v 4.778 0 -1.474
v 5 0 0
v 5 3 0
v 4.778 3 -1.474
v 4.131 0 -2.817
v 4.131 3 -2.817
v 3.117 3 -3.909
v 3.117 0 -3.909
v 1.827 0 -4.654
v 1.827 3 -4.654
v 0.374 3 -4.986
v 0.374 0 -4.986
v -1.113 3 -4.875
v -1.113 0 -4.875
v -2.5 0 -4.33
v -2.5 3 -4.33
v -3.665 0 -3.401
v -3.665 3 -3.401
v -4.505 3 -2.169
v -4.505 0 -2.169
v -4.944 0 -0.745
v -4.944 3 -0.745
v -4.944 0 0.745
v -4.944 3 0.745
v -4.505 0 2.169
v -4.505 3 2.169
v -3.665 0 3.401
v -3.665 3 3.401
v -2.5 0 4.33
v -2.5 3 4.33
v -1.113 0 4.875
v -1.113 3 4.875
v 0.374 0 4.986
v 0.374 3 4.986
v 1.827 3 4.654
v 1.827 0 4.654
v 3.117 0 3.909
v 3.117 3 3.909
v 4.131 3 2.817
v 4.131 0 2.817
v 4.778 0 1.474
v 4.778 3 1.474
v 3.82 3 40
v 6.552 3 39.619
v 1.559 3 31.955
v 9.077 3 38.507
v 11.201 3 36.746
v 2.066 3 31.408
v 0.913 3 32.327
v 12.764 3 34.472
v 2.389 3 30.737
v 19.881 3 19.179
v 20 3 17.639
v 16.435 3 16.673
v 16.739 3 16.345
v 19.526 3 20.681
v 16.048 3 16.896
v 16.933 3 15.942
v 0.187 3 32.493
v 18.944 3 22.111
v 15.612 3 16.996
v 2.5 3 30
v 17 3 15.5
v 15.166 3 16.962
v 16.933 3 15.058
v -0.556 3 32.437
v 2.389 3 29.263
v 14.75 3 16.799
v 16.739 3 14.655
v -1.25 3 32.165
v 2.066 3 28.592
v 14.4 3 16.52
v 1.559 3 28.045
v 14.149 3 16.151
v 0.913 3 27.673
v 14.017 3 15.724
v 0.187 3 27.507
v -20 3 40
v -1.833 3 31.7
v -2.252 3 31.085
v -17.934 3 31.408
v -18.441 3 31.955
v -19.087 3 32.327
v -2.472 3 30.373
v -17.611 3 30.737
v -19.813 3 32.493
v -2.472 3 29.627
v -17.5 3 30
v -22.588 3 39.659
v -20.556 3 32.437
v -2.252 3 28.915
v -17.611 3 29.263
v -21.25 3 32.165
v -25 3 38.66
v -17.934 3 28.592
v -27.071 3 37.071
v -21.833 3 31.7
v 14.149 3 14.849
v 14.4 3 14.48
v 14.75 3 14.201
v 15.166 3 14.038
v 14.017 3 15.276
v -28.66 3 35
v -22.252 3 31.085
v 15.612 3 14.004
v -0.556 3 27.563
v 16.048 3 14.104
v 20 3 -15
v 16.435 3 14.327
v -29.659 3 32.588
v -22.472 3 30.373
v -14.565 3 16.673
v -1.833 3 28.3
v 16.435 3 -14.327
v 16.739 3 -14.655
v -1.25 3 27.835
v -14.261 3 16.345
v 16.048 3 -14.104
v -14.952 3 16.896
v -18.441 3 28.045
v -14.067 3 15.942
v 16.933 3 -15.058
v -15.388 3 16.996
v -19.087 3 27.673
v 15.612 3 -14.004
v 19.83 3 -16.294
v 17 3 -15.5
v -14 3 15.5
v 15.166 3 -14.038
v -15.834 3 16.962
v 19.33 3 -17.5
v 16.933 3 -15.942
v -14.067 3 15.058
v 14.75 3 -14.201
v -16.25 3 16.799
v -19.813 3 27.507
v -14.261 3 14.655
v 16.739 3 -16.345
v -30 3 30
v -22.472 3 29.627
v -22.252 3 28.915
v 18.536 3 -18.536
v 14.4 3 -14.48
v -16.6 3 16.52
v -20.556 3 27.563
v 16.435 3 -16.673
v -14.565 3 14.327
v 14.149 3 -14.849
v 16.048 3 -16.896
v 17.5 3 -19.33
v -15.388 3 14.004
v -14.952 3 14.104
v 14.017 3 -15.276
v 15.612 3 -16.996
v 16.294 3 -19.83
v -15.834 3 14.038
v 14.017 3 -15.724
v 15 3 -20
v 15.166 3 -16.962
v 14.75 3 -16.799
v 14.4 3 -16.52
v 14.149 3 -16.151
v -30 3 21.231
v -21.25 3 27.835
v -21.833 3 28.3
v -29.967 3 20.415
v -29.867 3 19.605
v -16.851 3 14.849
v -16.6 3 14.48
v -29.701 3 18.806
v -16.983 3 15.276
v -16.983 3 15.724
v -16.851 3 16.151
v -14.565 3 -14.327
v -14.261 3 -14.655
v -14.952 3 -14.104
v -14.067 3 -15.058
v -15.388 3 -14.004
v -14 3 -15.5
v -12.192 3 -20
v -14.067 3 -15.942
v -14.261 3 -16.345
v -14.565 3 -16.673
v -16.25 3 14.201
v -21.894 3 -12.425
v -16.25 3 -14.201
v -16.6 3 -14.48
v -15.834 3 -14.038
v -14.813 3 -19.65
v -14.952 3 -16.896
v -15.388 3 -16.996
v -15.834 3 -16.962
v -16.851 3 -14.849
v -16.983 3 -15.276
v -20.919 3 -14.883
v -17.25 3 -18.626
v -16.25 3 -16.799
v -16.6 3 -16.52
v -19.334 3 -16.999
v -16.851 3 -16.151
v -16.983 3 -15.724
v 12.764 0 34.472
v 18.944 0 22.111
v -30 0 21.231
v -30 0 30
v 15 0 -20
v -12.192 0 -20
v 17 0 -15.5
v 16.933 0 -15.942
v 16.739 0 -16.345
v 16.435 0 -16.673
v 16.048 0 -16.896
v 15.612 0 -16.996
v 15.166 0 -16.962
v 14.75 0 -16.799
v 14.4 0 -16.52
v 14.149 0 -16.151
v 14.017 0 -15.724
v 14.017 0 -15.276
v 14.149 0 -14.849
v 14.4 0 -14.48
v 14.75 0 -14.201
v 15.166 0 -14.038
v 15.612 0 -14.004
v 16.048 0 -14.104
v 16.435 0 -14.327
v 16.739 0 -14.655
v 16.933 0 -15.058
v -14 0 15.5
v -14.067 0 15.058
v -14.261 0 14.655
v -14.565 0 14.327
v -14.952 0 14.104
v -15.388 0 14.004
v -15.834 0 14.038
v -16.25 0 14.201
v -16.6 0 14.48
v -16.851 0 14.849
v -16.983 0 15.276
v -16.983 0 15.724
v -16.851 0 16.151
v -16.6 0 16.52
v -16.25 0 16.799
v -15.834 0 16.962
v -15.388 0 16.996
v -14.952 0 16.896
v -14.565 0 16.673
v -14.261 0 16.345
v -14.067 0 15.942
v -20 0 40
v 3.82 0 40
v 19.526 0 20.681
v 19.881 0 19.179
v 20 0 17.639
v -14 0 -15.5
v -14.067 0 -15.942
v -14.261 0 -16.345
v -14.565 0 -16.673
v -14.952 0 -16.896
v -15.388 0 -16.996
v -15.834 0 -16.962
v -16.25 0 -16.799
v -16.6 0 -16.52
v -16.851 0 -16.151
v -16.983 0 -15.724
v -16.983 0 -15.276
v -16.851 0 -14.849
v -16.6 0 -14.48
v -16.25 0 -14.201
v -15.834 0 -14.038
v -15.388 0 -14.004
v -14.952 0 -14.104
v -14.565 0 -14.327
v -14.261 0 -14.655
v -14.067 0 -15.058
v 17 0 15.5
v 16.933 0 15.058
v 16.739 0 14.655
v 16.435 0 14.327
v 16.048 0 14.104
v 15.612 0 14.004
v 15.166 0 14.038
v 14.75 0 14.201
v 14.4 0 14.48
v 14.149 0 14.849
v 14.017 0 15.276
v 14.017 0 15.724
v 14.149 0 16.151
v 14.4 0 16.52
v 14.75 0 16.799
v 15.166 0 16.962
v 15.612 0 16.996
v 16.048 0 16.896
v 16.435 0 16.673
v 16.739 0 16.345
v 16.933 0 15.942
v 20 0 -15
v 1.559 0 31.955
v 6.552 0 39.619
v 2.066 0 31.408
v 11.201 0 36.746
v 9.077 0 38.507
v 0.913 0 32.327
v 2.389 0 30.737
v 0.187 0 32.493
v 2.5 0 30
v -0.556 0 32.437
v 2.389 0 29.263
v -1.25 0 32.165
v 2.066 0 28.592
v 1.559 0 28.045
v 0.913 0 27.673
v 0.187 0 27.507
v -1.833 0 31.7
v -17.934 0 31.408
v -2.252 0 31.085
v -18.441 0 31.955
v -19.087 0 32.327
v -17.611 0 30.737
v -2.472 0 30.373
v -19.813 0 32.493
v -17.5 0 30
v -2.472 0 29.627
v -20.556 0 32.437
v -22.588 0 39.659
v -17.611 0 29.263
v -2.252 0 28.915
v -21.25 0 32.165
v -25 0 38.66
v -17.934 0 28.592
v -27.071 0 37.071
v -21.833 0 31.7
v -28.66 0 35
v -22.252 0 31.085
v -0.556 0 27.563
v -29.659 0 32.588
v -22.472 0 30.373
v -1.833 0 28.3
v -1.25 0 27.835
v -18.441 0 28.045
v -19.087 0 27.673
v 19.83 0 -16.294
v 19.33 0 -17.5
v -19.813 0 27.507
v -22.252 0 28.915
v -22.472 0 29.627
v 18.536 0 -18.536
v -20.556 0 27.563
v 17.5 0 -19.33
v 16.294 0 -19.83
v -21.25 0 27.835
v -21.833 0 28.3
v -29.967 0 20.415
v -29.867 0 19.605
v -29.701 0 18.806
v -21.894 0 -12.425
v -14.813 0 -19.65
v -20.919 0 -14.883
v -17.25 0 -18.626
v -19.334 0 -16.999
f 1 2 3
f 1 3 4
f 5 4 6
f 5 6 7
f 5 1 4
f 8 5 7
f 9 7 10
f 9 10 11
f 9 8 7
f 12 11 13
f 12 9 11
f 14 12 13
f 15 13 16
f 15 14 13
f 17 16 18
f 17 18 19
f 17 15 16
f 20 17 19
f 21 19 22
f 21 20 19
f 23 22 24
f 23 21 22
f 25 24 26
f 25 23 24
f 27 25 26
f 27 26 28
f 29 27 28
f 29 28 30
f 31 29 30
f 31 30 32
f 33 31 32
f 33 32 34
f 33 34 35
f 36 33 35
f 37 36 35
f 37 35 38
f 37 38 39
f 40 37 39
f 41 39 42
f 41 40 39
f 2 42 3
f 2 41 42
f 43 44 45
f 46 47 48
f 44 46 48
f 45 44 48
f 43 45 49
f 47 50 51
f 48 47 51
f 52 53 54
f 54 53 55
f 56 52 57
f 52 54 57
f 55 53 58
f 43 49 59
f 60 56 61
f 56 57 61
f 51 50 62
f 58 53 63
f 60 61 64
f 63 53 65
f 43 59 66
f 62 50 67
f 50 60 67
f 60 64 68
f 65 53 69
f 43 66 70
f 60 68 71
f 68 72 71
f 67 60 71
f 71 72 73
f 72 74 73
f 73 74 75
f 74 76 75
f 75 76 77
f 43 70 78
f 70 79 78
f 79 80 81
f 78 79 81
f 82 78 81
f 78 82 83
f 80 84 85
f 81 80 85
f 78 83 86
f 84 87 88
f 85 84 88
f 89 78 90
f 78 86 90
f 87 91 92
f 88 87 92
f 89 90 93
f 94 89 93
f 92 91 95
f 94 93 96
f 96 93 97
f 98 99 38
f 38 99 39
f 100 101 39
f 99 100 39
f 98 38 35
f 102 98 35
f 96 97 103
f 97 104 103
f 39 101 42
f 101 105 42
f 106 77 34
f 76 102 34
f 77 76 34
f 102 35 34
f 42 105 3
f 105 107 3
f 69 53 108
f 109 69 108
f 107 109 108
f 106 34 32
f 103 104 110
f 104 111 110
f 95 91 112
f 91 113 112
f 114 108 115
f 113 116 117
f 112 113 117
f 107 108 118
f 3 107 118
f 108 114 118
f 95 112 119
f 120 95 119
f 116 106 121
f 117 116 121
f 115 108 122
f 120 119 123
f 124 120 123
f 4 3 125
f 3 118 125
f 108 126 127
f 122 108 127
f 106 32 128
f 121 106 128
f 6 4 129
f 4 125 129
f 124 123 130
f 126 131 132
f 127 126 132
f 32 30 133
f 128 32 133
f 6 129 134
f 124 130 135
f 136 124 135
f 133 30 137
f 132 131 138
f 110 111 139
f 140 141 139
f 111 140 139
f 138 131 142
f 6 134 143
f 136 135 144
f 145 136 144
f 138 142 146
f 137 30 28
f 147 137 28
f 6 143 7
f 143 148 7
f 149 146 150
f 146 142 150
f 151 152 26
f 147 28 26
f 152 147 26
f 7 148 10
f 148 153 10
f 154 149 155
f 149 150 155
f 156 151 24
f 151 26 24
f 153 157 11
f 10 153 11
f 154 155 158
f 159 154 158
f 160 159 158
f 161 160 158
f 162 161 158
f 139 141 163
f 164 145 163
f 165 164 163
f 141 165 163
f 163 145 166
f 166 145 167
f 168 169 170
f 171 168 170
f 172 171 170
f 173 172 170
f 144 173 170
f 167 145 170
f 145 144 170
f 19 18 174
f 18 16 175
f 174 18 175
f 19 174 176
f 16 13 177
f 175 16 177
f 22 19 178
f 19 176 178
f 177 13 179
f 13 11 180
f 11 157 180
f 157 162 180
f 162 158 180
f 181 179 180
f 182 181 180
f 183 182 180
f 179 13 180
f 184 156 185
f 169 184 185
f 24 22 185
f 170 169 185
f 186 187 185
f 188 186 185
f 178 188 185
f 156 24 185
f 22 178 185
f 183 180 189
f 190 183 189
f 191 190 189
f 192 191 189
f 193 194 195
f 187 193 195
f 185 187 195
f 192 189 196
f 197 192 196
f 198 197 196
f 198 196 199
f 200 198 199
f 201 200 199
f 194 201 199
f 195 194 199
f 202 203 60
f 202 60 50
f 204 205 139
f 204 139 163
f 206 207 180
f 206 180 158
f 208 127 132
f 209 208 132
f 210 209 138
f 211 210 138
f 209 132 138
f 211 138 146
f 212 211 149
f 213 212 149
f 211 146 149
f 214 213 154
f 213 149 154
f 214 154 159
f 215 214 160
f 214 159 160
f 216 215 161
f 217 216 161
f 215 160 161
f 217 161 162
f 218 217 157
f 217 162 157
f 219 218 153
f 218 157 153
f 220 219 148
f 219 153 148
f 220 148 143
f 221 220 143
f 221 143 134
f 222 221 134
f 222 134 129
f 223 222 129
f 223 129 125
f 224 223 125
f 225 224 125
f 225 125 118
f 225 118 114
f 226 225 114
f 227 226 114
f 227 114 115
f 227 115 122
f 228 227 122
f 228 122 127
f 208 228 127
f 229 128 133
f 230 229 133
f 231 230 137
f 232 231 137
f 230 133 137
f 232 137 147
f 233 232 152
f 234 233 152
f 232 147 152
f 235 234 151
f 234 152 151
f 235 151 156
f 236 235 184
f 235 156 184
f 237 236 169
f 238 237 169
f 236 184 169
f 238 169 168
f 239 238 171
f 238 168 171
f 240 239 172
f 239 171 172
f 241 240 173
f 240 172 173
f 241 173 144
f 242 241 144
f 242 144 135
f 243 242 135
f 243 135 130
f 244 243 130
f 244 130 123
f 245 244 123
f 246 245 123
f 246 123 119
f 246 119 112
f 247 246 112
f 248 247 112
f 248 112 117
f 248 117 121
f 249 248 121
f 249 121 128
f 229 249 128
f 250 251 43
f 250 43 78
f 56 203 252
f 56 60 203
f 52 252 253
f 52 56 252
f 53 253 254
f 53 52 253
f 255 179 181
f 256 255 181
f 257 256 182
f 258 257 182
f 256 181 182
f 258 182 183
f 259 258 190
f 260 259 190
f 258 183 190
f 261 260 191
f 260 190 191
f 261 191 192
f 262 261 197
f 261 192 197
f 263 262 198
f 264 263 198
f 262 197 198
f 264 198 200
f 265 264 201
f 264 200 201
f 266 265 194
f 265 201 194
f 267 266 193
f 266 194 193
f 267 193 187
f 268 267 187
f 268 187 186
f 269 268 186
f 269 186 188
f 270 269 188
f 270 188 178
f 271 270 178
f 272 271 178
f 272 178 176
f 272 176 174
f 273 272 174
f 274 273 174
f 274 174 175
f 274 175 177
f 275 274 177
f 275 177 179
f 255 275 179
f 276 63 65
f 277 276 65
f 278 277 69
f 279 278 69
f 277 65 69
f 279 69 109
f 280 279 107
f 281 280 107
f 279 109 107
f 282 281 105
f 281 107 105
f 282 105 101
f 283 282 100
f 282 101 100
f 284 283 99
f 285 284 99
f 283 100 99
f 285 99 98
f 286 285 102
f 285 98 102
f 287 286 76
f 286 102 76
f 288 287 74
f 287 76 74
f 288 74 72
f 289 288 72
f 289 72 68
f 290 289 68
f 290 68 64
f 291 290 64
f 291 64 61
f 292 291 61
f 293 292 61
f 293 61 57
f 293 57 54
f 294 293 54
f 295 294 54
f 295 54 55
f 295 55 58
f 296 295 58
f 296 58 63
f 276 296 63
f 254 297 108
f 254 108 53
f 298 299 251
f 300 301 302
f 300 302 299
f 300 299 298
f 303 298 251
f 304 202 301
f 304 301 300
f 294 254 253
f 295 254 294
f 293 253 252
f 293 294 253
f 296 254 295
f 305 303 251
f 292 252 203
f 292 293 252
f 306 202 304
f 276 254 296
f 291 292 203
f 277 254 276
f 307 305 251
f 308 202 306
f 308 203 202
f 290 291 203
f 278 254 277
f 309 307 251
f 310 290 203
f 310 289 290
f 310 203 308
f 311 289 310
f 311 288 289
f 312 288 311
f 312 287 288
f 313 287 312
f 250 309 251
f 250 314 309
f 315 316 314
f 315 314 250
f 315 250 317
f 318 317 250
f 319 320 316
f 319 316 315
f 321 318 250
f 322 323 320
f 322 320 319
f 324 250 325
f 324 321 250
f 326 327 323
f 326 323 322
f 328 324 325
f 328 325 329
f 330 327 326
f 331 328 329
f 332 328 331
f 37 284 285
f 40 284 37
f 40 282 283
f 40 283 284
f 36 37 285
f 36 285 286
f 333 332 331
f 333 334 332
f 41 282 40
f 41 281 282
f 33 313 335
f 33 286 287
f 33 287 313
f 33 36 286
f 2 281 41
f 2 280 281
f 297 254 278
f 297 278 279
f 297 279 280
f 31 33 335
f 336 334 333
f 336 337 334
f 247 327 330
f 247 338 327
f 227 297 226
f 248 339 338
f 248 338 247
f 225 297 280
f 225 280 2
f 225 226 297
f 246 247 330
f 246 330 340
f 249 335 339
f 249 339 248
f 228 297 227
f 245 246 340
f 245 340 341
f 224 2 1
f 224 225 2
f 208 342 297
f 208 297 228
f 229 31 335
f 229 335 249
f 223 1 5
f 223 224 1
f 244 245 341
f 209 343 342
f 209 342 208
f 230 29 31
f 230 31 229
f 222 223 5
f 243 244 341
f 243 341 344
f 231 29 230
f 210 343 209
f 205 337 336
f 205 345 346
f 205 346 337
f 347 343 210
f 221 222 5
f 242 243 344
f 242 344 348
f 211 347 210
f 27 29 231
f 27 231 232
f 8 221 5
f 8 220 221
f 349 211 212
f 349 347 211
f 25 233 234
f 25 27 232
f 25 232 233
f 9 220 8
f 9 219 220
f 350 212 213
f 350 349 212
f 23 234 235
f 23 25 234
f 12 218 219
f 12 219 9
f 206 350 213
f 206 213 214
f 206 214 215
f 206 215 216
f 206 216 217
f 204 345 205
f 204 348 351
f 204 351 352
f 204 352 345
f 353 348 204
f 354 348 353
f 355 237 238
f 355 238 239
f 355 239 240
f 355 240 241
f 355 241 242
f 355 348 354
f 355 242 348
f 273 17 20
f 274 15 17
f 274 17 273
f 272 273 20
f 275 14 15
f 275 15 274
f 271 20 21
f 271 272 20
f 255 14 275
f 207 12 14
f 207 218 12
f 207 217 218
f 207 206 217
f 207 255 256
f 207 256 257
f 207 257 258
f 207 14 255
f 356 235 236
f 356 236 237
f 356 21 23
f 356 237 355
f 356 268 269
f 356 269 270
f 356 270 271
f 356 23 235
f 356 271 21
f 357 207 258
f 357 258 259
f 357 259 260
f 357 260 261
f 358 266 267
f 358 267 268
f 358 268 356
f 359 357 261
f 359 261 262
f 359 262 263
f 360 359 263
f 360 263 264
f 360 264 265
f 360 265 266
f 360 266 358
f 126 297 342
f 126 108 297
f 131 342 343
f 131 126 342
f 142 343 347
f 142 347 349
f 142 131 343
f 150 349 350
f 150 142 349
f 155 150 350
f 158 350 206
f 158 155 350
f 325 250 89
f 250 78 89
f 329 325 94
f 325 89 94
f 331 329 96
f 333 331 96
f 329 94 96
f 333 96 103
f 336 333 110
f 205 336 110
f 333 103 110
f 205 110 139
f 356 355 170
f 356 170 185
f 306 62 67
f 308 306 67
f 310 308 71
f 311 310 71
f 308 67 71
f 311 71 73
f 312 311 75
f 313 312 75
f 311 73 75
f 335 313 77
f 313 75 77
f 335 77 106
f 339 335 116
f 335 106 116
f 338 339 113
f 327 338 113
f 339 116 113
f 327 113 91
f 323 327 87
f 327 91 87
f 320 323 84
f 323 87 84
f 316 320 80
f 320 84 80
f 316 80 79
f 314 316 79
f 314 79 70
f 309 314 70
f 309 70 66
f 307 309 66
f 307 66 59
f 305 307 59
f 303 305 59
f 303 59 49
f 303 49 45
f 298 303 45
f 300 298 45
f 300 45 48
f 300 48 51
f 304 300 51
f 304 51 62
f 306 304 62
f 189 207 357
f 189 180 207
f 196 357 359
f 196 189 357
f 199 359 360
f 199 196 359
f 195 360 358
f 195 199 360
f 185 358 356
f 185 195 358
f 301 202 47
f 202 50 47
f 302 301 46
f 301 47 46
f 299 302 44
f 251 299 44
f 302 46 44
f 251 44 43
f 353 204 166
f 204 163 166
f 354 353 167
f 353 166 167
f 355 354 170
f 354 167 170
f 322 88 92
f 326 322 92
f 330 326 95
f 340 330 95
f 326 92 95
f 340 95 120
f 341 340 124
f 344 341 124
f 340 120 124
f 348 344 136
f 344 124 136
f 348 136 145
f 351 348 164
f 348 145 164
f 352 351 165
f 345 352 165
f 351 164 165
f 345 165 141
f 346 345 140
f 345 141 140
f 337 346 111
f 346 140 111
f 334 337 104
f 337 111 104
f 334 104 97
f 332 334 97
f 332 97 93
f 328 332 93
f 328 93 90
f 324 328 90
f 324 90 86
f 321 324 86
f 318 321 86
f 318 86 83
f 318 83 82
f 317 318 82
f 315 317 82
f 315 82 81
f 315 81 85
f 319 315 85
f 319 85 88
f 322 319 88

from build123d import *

# Parameters (mm, degrees)
SKETCH1_R            = 5
BOSS_EXTRUDE1_DEPTH  = 3
SKETCH2_R            = 1.5
CUT_EXTRUDE1_DEPTH   = 4
LPATTERN1_COUNT      = 2
LPATTERN1_PITCH      = 31
LPATTERN1_COUNT_DIR2 = 2
LPATTERN1_PITCH_DIR2 = 31
SKETCH3_R            = 2.5
CUT_EXTRUDE2_DEPTH   = 4
LPATTERN2_COUNT      = 2
LPATTERN2_PITCH      = 20
FILLET1_R            = 10
FILLET2_R            = 5


with BuildPart() as part:
    # Sketch1 → Boss-Extrude1 (new body)
    with BuildSketch(Plane(origin=(0, 0, 0), x_dir=(1, 0, 0), z_dir=(0, 1, 0))):
        Polygon((20, -20), (10, -40), (-30, -40), (-30, -20), (-20, 20), (20, 20), align=None)
        Circle(SKETCH1_R, mode=Mode.SUBTRACT)
    extrude(amount=BOSS_EXTRUDE1_DEPTH)

    # Sketch2 → Cut-Extrude1 (cut, through all)
    with BuildSketch(Plane(origin=(0, 3, 0), x_dir=(1, 0, 0), z_dir=(0, 1, 0))):
        with Locations((-15.5, 15.5)):
            Circle(SKETCH2_R)
    cut_extrude1 = extrude(amount=-CUT_EXTRUDE1_DEPTH, mode=Mode.SUBTRACT)

    # LPattern1: Cut-Extrude1 2 × 2
    with Locations(*[(i * LPATTERN1_PITCH, 0, j * LPATTERN1_PITCH_DIR2) for i in range(LPATTERN1_COUNT) for j in range(LPATTERN1_COUNT_DIR2) if (i, j) != (0, 0)]):
        add(cut_extrude1, mode=Mode.SUBTRACT)

    # Sketch3 → Cut-Extrude2 (cut, through all)
    with BuildSketch(Plane(origin=(0, 3, 0), x_dir=(1, 0, 0), z_dir=(0, 1, 0))):
        with Locations((-20, -30)):
            Circle(SKETCH3_R)
    cut_extrude2 = extrude(amount=-CUT_EXTRUDE2_DEPTH, mode=Mode.SUBTRACT)

    # LPattern2: Cut-Extrude2 ×2
    with Locations(*[(i * LPATTERN2_PITCH, 0, 0) for i in range(1, LPATTERN2_COUNT)]):
        add(cut_extrude2, mode=Mode.SUBTRACT)

    # Fillet1
    fillet1_edges = [part.edges().sort_by_distance(p)[0] for p in [
        (-30, 1.5, 40),
        (-30, 1.5, 20),
        (-20, 1.5, -20),
        (20, 1.5, 20),
        (10, 1.5, 40),
    ]]
    fillet(fillet1_edges, radius=FILLET1_R)

    # Fillet2
    fillet2_edges = [part.edges().sort_by_distance(p)[0] for p in [
        (20, 1.5, -20),
    ]]
    fillet(fillet2_edges, radius=FILLET2_R)


solid = part.part
